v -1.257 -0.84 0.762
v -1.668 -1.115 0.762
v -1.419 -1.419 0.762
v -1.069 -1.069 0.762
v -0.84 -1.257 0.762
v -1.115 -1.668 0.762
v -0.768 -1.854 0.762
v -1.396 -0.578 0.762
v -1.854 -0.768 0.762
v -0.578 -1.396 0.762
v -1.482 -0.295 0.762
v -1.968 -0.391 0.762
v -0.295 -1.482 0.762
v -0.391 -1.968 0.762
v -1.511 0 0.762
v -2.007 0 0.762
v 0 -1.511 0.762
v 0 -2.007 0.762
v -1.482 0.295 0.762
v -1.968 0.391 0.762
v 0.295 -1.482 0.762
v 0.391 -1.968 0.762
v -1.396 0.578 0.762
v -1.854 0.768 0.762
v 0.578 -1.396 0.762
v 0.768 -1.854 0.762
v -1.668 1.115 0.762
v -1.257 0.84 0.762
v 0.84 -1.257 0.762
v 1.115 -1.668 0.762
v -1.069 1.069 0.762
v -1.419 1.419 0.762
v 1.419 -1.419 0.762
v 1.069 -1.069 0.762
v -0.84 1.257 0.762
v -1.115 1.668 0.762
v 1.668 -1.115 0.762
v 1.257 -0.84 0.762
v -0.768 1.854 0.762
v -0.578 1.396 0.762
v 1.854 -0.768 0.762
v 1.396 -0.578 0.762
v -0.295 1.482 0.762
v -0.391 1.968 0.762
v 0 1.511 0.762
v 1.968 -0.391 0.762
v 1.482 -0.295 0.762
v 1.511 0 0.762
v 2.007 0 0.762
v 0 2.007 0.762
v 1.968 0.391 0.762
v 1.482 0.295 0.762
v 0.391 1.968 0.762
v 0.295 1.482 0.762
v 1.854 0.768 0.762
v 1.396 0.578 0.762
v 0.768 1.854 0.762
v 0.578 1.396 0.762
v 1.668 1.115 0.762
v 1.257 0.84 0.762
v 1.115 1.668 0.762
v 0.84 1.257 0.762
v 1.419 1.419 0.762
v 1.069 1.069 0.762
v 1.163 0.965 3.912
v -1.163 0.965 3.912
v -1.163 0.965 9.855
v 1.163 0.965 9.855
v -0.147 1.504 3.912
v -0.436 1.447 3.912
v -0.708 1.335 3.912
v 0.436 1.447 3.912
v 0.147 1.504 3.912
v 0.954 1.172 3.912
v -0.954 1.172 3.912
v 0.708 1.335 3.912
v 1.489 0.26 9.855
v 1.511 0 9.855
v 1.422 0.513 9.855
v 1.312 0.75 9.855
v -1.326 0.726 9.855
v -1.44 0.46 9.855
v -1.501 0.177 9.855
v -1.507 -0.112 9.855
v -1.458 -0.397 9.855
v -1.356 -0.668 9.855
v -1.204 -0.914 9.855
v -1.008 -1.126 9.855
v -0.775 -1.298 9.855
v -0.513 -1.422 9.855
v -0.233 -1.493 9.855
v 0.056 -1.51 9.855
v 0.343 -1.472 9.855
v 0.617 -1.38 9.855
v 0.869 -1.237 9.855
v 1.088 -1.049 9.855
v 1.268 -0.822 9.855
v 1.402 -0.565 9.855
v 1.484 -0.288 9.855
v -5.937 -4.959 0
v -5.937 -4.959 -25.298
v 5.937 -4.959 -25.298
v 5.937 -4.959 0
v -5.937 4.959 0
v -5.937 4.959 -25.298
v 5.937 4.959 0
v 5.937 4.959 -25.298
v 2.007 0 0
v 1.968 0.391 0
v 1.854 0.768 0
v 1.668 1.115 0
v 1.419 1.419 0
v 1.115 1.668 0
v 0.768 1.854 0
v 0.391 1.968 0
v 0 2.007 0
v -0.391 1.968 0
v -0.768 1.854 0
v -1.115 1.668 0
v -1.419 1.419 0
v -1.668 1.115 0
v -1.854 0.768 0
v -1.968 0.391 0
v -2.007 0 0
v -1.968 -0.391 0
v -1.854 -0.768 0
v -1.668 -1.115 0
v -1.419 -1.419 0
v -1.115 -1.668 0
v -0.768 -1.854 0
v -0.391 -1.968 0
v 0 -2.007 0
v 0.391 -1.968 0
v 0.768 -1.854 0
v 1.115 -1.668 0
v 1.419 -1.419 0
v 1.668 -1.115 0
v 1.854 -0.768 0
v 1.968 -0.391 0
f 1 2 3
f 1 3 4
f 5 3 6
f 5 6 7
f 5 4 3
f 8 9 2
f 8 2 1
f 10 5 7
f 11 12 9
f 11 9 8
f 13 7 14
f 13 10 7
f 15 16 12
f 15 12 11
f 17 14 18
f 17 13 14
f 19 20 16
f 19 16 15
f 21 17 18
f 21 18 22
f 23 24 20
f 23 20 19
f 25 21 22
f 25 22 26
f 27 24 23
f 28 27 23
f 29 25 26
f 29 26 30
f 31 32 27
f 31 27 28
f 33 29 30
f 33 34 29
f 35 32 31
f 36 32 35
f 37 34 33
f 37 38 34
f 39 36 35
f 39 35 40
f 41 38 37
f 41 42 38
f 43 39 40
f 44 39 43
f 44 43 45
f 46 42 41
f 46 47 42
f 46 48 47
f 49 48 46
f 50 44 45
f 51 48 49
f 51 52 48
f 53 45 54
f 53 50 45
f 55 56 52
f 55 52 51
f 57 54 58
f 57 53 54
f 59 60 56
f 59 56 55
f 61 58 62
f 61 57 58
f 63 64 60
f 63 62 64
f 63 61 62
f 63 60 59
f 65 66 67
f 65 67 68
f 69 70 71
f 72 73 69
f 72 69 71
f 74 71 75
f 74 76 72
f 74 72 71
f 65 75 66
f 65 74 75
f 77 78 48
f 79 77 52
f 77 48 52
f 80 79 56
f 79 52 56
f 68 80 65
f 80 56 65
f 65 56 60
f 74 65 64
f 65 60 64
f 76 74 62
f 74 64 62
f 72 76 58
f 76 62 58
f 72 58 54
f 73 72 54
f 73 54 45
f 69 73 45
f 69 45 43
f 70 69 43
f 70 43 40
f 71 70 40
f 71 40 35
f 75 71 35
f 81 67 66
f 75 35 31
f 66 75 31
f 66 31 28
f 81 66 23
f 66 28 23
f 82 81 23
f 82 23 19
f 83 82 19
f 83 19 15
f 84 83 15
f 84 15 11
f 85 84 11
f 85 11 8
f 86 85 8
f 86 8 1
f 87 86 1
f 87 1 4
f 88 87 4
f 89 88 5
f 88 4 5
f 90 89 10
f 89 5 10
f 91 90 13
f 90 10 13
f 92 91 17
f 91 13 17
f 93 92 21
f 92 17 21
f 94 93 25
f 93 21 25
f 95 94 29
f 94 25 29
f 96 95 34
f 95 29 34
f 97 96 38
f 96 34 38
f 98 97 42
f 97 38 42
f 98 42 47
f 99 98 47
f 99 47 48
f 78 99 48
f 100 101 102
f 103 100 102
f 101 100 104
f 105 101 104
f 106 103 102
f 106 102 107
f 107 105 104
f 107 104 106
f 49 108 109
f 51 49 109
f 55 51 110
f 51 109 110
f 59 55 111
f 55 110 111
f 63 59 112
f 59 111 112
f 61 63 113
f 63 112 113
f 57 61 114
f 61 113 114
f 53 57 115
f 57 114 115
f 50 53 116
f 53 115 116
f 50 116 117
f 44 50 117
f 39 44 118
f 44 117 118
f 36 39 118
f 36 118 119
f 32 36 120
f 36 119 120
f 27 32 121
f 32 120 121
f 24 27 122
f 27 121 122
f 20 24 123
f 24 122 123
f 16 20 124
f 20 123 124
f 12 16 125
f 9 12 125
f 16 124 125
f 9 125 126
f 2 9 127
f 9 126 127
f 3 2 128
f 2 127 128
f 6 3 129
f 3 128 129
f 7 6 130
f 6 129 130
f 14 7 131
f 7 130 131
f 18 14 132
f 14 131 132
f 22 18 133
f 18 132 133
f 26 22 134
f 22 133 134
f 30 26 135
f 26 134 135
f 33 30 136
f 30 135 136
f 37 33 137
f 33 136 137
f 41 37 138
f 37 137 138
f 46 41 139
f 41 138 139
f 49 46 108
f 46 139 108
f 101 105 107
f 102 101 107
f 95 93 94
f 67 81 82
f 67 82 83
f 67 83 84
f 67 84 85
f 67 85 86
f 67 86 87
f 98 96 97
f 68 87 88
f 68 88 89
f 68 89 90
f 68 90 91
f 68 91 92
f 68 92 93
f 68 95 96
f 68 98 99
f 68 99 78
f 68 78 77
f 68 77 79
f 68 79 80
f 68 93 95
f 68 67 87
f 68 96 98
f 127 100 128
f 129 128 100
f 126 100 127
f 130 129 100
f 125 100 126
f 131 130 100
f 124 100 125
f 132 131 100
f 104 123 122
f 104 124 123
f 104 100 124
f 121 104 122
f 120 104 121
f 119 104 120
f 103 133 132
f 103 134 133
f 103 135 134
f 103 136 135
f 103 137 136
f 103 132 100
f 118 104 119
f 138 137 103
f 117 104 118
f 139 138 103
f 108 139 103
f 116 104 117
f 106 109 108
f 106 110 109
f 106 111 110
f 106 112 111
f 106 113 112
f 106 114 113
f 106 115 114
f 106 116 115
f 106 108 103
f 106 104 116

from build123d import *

# Parameters (mm, degrees)
SKETCH1_W           = 11.8745
SKETCH1_H           = 9.9187
BOSS_EXTRUDE1_DEPTH = 25.2984
SKETCH2_R           = 2.0066
BOSS_EXTRUDE2_DEPTH = 0.762
SKETCH3_R           = 1.5113
BOSS_EXTRUDE3_DEPTH = 9.0932
CUT_EXTRUDE1_DEPTH  = 5.9436


with BuildPart() as part:
    # Sketch1 → Boss-Extrude1 (new body)
    with BuildSketch(Plane.XY):
        Rectangle(SKETCH1_W, SKETCH1_H)
    extrude(amount=-BOSS_EXTRUDE1_DEPTH)

    # Sketch2 → Boss-Extrude2 (add)
    with BuildSketch(Plane.XY):
        Circle(SKETCH2_R)
    extrude(amount=BOSS_EXTRUDE2_DEPTH)

    # Sketch3 → Boss-Extrude3 (add)
    with BuildSketch(Plane.XY.offset(0.762)):
        Circle(SKETCH3_R)
    extrude(amount=BOSS_EXTRUDE3_DEPTH)

    # Sketch4 → Cut-Extrude1 (cut)
    with BuildSketch(Plane.XY.offset(9.8552)):
        Polygon((-31.544055033, 0.9652), (-1.667569456, 0.9652), (2.041996645, 0.9652), (31.918482222, 0.9652), (31.918482222, 60.718171154), (-31.544055033, 60.718171154), align=None)
    extrude(amount=-CUT_EXTRUDE1_DEPTH, mode=Mode.SUBTRACT)


solid = part.part
